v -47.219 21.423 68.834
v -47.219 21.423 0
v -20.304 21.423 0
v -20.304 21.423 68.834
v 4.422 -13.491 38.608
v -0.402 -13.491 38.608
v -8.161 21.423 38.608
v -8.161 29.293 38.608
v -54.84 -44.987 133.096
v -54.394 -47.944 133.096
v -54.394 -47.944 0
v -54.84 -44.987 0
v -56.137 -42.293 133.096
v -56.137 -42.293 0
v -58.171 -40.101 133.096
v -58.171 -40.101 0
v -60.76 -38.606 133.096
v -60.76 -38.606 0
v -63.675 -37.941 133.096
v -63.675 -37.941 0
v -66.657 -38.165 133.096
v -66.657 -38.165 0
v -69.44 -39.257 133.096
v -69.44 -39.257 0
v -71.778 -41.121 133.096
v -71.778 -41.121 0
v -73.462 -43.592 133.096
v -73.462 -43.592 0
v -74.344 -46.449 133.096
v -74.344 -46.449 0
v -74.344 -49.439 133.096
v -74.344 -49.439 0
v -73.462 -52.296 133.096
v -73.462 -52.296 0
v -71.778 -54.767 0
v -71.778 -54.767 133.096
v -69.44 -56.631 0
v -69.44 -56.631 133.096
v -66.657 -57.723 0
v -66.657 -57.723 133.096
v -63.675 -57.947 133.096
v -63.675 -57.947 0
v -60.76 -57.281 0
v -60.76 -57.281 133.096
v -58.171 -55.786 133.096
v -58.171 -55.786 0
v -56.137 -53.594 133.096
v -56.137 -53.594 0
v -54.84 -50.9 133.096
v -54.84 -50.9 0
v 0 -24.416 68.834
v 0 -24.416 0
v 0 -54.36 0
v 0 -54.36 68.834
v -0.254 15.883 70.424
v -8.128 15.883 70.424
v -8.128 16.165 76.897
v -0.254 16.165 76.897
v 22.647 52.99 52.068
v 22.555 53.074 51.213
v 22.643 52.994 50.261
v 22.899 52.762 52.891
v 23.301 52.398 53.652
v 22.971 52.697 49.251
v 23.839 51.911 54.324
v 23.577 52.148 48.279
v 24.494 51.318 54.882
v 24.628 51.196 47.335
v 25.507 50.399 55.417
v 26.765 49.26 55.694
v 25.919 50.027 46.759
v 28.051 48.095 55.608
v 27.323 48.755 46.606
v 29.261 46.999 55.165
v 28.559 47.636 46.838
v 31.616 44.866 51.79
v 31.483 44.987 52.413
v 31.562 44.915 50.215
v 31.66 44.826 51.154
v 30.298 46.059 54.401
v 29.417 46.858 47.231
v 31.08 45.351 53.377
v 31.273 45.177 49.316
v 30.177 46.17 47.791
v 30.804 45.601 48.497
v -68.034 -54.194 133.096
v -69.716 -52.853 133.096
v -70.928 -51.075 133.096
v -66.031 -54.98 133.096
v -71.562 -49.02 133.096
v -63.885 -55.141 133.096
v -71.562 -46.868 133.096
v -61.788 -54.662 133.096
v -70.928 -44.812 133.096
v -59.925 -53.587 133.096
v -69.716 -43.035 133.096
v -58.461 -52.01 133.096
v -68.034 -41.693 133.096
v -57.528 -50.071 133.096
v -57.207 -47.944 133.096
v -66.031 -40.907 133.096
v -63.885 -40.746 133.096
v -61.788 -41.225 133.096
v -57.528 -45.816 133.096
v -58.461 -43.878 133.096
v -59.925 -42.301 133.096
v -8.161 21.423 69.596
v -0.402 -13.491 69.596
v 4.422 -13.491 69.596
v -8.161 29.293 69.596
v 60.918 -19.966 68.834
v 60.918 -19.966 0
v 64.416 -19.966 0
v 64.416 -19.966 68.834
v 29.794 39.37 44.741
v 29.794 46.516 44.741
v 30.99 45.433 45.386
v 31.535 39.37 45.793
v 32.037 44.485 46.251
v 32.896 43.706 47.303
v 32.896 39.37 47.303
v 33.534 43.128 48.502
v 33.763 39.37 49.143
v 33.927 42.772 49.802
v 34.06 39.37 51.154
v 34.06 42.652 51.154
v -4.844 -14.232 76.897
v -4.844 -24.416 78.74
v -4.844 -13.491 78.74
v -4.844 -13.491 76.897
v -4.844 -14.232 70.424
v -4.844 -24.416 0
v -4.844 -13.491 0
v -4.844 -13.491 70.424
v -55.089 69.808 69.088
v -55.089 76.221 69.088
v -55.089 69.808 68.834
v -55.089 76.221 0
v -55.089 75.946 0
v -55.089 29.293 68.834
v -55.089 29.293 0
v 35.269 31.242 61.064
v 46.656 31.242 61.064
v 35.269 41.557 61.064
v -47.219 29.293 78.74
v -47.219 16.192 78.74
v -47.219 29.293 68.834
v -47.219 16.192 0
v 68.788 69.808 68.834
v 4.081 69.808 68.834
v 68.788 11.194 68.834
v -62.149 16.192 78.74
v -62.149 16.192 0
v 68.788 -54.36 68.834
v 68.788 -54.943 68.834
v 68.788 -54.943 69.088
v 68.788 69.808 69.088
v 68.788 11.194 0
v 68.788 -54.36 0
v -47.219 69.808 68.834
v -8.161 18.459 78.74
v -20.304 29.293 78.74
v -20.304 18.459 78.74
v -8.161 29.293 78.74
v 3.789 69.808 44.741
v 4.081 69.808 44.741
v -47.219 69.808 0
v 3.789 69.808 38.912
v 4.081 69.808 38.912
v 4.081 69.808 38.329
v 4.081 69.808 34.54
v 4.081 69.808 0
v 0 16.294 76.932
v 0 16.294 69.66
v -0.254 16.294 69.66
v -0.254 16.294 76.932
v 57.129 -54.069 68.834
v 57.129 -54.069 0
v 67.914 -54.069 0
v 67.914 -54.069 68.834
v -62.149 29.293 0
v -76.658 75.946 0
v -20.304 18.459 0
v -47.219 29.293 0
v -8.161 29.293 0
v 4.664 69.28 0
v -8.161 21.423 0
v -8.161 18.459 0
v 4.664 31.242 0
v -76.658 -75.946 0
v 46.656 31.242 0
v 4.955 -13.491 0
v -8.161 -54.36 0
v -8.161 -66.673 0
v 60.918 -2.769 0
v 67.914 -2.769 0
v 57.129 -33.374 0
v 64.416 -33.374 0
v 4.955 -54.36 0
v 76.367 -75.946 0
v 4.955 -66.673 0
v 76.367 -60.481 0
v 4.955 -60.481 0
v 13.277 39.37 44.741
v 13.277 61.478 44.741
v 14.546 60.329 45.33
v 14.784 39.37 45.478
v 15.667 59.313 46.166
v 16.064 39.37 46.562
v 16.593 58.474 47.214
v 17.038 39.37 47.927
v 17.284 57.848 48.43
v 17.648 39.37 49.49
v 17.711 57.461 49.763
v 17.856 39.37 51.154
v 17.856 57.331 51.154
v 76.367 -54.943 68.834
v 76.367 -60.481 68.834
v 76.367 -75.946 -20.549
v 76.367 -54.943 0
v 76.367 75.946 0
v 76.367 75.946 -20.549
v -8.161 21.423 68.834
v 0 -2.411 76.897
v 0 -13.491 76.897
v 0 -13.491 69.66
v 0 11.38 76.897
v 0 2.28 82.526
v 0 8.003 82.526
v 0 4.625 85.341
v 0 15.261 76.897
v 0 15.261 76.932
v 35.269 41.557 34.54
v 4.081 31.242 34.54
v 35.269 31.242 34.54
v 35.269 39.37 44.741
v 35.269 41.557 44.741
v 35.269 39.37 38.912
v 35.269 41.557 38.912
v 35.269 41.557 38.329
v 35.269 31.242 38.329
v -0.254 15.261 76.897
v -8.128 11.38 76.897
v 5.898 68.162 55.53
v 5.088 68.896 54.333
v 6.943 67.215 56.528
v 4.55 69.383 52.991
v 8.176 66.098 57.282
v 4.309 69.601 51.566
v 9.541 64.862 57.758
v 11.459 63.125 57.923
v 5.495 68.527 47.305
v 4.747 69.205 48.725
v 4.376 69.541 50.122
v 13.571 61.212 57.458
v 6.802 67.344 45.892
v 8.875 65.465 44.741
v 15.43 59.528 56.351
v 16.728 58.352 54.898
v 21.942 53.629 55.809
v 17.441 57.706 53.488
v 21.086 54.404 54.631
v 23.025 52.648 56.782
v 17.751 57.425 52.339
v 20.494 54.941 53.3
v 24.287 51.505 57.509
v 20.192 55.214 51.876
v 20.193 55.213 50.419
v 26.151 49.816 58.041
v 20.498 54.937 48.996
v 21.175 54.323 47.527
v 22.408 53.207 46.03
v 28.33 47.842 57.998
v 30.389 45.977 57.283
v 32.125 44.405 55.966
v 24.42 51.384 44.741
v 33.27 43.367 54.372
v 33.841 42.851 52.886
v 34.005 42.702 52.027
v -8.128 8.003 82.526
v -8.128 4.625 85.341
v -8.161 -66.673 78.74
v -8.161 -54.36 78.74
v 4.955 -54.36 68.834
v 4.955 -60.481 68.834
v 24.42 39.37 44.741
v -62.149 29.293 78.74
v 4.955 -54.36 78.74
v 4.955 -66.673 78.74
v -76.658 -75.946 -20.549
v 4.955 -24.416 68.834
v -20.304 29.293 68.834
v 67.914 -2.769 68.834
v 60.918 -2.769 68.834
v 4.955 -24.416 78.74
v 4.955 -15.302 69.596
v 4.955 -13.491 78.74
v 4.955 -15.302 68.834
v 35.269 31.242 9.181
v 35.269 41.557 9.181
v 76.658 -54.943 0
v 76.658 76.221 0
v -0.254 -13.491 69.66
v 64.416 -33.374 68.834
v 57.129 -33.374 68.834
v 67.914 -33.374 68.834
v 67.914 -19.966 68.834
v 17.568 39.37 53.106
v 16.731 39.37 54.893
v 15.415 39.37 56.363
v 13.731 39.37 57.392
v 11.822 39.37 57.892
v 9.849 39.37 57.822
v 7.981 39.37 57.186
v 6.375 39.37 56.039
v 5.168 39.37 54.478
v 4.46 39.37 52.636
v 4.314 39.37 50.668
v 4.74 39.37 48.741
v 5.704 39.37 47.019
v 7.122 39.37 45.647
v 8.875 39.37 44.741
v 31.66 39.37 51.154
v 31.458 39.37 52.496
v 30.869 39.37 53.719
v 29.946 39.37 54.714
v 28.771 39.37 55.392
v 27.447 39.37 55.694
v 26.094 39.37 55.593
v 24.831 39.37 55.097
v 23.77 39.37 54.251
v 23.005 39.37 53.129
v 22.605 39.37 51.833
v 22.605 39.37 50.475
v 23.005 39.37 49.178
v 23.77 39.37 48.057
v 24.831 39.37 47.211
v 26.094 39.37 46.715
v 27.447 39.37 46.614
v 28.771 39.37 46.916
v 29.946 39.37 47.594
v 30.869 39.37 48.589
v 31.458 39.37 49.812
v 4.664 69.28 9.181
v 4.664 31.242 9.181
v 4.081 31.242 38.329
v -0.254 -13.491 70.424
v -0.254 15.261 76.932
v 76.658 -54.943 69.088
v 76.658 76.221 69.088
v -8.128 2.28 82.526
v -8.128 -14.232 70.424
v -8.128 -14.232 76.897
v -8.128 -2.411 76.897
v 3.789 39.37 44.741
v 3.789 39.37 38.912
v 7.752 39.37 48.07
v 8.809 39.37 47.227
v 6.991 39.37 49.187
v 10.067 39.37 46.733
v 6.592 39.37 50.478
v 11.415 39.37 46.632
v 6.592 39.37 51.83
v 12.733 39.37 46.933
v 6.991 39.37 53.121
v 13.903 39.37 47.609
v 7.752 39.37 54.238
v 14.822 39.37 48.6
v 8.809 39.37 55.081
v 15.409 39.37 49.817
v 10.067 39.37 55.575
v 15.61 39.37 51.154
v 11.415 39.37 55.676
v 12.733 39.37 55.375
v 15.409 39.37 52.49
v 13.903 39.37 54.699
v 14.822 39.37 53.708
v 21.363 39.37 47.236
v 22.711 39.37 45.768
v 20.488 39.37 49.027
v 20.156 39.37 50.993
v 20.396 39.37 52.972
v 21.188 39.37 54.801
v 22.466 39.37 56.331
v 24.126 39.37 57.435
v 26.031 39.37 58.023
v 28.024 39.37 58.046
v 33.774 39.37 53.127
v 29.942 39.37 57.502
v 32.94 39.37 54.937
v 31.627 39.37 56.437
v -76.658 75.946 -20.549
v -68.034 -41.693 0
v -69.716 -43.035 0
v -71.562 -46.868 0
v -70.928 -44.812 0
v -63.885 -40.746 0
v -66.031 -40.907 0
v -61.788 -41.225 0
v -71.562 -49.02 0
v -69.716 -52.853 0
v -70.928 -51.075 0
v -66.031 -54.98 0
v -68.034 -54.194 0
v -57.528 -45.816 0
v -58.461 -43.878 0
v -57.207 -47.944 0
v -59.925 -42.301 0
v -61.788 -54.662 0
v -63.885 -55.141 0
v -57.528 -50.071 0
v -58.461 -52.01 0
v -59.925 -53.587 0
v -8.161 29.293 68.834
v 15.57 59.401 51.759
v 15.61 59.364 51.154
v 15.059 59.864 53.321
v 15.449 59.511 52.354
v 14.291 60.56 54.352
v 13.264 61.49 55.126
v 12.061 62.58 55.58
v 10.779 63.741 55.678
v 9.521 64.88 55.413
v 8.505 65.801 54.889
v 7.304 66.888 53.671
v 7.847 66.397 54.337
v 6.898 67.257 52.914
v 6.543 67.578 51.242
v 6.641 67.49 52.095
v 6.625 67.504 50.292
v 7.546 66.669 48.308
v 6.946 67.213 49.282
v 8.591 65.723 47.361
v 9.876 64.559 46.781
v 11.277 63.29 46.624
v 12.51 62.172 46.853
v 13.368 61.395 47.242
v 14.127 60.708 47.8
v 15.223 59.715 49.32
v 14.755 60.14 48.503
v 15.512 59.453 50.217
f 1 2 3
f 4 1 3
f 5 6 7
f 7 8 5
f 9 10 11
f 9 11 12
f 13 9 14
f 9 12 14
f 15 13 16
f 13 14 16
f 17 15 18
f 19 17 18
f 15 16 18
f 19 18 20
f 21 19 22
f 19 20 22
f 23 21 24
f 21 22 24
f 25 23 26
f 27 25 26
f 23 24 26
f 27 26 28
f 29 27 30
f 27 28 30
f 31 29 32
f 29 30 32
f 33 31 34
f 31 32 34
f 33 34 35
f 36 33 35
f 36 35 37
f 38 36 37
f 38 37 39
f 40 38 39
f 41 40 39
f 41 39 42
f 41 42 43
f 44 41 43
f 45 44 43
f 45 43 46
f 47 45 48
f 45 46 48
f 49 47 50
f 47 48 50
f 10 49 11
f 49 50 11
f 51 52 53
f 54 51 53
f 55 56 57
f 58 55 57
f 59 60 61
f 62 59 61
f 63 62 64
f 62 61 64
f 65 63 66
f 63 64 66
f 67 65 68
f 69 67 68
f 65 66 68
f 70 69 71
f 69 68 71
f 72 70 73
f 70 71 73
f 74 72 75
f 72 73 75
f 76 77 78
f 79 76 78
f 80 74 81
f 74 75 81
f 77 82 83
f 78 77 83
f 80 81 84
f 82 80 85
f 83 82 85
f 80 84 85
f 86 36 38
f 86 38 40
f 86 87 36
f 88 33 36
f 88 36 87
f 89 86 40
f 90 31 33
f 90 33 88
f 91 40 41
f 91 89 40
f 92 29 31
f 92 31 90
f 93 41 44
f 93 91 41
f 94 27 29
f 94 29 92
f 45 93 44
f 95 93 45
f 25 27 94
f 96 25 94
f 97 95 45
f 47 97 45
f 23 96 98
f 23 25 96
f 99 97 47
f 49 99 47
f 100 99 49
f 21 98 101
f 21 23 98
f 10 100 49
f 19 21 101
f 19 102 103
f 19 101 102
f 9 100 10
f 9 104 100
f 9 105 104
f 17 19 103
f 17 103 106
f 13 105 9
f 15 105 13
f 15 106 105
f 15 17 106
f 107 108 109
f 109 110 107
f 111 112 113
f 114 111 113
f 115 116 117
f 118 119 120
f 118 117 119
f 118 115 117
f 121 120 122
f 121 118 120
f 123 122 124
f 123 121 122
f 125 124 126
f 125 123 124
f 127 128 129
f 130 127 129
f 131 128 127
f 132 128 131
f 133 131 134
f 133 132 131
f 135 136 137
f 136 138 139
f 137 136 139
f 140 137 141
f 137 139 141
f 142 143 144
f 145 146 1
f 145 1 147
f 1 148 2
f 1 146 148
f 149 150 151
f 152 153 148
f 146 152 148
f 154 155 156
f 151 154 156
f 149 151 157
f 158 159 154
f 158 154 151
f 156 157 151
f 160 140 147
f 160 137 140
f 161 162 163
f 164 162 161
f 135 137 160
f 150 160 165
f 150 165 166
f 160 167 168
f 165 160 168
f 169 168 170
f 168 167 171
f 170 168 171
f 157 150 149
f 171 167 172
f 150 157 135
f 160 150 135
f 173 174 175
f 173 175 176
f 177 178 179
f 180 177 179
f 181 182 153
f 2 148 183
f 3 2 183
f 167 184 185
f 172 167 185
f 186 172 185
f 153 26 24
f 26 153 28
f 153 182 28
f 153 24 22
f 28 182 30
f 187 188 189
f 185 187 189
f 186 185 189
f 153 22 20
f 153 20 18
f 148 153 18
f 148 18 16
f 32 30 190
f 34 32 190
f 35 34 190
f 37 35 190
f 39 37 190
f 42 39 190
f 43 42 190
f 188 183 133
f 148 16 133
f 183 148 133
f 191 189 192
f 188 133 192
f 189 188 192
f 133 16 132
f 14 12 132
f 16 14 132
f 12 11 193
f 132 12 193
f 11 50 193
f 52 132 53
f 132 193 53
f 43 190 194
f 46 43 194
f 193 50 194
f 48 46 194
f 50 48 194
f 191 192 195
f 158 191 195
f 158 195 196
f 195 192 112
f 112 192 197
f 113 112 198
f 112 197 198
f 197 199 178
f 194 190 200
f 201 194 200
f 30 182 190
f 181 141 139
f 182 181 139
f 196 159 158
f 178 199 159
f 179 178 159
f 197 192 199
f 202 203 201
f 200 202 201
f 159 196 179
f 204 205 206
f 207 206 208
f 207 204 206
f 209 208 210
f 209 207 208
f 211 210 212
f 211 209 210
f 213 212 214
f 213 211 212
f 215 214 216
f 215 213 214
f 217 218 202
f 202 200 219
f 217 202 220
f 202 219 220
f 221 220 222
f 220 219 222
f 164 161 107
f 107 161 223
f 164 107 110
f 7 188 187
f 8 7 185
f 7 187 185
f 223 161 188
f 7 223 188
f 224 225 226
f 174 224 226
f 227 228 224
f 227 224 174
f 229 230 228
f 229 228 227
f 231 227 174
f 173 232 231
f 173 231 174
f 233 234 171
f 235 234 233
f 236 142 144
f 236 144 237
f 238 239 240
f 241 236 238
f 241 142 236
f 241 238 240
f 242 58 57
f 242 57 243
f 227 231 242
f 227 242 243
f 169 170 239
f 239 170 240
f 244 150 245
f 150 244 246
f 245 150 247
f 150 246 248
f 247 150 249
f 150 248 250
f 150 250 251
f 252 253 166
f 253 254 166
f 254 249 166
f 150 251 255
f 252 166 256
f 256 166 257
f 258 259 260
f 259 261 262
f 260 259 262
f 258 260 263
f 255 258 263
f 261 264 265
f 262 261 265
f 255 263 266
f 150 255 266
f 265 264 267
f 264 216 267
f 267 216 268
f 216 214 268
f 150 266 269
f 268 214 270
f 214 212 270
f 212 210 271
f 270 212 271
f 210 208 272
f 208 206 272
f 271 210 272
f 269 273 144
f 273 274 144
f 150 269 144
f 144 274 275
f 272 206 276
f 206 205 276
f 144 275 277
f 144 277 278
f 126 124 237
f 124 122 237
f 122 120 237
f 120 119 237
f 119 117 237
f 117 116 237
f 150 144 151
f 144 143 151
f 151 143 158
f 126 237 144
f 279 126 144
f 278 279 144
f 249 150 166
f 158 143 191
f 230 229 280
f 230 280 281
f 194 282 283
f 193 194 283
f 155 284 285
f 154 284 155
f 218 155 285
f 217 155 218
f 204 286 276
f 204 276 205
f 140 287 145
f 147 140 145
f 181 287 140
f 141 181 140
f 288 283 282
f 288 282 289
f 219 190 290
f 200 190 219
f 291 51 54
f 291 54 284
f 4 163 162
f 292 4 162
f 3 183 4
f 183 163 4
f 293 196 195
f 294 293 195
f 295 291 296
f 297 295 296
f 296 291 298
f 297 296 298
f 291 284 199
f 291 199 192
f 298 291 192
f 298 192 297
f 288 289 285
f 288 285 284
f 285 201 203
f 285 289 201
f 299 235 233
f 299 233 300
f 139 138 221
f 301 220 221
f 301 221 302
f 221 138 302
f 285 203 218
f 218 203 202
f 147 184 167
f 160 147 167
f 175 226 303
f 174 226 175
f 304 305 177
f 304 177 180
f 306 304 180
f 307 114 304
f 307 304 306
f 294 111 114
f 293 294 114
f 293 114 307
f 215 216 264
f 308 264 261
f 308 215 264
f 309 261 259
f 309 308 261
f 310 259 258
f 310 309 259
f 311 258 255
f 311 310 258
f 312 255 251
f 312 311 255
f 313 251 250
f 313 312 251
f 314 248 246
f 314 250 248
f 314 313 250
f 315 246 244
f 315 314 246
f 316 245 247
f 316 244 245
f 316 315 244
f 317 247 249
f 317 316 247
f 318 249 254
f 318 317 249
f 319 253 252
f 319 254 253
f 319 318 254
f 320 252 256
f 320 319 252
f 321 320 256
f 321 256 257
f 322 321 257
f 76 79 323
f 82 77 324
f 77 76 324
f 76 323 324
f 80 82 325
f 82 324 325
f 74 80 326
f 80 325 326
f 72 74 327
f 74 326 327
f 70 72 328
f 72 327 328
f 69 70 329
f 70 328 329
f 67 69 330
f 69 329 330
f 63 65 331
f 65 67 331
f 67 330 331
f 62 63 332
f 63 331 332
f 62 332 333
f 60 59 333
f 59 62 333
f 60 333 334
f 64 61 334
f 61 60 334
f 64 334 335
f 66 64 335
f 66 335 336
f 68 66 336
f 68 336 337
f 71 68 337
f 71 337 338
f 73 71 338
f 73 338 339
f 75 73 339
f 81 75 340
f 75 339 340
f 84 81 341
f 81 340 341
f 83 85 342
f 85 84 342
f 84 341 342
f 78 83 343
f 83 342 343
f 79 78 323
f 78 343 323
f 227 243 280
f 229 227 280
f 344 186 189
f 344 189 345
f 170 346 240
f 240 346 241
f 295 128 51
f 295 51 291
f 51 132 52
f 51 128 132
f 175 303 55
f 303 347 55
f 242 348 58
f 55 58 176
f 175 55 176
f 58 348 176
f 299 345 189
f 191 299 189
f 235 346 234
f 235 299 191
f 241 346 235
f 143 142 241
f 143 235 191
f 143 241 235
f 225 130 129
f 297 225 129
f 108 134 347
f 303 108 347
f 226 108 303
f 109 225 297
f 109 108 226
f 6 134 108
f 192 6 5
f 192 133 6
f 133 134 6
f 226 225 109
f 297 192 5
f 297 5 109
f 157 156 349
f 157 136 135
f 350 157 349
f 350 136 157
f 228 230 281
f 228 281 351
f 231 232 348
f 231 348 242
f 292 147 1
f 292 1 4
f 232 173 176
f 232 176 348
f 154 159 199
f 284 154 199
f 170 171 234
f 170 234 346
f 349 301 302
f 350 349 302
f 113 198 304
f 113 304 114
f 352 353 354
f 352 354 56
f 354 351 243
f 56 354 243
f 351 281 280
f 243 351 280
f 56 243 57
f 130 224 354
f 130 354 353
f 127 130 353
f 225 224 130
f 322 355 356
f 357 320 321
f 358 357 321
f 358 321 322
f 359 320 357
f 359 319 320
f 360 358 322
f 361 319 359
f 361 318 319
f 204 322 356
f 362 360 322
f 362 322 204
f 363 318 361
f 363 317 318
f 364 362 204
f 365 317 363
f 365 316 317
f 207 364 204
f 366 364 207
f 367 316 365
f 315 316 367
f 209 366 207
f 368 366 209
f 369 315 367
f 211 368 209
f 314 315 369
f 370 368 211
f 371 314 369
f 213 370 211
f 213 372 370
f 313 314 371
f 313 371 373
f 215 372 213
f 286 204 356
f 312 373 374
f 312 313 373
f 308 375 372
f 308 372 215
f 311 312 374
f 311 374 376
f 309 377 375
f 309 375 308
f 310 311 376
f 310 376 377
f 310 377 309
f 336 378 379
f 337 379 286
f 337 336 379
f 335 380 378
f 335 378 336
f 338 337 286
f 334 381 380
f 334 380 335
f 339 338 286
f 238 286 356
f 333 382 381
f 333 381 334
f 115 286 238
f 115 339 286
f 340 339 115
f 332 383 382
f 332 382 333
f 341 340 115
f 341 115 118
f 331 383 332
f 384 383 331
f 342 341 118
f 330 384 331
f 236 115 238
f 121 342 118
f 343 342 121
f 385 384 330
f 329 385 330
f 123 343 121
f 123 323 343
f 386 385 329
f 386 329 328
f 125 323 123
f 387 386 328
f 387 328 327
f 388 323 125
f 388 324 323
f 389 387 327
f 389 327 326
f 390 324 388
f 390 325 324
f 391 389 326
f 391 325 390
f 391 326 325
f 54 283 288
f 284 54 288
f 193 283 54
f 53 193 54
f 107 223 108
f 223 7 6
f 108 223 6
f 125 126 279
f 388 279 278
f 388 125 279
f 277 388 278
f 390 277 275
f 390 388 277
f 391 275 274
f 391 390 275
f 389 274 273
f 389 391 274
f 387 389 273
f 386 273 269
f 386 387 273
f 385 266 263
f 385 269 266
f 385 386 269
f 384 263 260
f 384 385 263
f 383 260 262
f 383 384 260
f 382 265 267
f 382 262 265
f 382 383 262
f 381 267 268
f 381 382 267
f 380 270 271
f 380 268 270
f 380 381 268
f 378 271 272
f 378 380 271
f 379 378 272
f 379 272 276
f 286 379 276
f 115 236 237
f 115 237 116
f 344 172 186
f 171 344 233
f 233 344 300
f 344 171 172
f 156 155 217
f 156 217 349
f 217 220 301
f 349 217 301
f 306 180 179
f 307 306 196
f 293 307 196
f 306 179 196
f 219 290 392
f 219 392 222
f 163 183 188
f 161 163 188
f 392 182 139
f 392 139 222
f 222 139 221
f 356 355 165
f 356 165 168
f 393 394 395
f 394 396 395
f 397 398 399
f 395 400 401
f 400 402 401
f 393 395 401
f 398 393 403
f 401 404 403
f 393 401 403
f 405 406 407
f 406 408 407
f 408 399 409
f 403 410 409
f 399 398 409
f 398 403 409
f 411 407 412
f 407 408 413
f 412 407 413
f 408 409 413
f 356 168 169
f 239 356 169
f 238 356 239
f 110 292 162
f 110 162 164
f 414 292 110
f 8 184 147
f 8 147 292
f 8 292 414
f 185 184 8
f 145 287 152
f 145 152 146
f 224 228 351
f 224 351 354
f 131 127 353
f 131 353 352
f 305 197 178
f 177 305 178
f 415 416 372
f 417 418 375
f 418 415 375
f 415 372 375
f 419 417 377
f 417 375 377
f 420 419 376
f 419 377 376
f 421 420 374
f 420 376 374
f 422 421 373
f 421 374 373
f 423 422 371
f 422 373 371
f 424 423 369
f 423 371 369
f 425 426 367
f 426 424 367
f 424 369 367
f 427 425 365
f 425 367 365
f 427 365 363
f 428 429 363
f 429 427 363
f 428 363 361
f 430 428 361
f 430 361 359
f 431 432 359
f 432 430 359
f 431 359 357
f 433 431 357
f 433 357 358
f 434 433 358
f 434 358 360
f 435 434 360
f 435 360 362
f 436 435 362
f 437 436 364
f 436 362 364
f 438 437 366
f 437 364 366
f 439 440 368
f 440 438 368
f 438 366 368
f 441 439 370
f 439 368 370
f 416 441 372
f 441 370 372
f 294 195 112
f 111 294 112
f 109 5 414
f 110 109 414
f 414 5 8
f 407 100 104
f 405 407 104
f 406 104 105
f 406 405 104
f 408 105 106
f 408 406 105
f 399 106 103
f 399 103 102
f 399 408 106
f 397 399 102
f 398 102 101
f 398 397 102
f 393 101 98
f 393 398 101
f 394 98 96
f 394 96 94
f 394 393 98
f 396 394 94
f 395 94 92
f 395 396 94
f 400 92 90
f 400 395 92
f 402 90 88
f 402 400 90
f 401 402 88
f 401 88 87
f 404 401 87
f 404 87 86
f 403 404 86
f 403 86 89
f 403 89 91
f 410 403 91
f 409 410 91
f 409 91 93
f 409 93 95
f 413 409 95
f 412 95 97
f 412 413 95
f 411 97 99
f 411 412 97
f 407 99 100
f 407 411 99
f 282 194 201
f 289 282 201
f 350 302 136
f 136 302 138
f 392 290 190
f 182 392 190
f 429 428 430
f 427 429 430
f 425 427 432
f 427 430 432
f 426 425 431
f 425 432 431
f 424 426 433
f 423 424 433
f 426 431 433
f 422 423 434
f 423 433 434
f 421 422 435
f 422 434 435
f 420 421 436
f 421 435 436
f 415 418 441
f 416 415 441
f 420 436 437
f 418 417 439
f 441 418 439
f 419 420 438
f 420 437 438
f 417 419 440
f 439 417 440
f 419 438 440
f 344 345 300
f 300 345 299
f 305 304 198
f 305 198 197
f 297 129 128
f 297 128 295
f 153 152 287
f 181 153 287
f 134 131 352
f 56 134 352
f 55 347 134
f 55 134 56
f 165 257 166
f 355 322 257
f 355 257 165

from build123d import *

# Parameters (mm, degrees)
F0_W          = 153.0245915055
F0_H          = 20.5490160733
F1_DEPTH      = 75.946
F1_DEPTH_BACK = 75.946
F3_DEPTH      = 68.834
F5_START      = -31.242
F4_W          = 31.1878696084
F4_H          = 3.7891790271
F4_W_2        = 30.604918953
F4_H_2        = 9.1814752668
F5_DEPTH      = 38.862
F7_START      = -39.37
F6_R          = 4.5342929644
F6_R_2        = 4.5529905845
F7_DEPTH      = 30.734
F8_W          = 7.8698322177
F8_H          = 124.7514784336
F9_DEPTH      = 69.088
F10_W         = 3.4977030009
F10_H         = 13.4078674018
F11_DEPTH     = 68.834
F12_W         = 4.9550831318
F12_H         = 39.0577064827
F12_W_2       = 39.0577036887
F12_H_2       = 7.869835943
F13_DEPTH     = 68.834
F15_START     = 38.608
F15_DEPTH     = 30.988
F16_W         = 9.7991945222
F16_H         = 10.9250182286
F16_W_2       = 12.1427290142
F16_H_2       = 10.8340159059
F16_W_3       = 14.9299055338
F16_H_3       = 13.1014734507
F16_W_4       = 13.116395101
F16_H_4       = 12.3132541776
F17_DEPTH     = 78.74
F19_DEPTH     = 8.128
F20_R         = 10.030835309
F20_R_2       = 7.2175731122
F21_DEPTH     = 133.096
F22_W         = 29.4703273103
F22_H         = 0.956825912
F23_DEPTH     = 0.254


with BuildPart() as f1:
    # F0 (on Front) → F1 (new body, two sides)
    with BuildSketch(Plane.XZ) as f1_sk:
        with Locations((-0.1457370818, -10.2745080367)):
            Rectangle(F0_W, F0_H)
    extrude(amount=F1_DEPTH)
    extrude(f1_sk.sketch, amount=-F1_DEPTH_BACK)

    # F2 (on face) → F3 (join)
    with BuildSketch(Plane.XY):
        Polygon((69.0796747804, 69.8083639145), (4.0806569159, 69.8083639145), (69.0796747804, 10.9303286299), align=None)
    extrude(amount=F3_DEPTH)

    # F4 (on Front) → F5 (join)
    with BuildSketch(Plane.XZ.offset(F5_START)):
        with Locations((19.6745917201, 36.4344269037)):
            Rectangle(F4_W, F4_H)
        Polygon((35.2685265243, 61.0640980303), (35.2685265243, 38.3290164173), (35.2685265243, 34.5398373902), (35.2685265243, 9.1814752668), (35.2685265243, 0), (68.7882006168, 0), (68.7882006168, 61.0640980303), align=None)
        with Locations((19.9660670478, 4.5907376334)):
            Rectangle(F4_W_2, F4_H_2)
    extrude(amount=-F5_DEPTH)

    # F6 (on Front) → F7 (join)
    with BuildSketch(Plane.XZ.offset(F7_START)):
        with BuildLine():
            ThreePointArc((13.2766587373, 44.7414778173), (16.5933676498, 47.2141890003), (17.8556101724, 51.153935492))
            ThreePointArc((17.8556101724, 51.153935492), (7.13631922, 56.6712374301), (8.875472686, 44.7414778173))
            Line((8.875472686, 44.7414778173), (13.2766587373, 44.7414778173))
        make_face()
        with Locations((11.0760657117, 51.153935492)):
            Circle(F6_R, mode=Mode.SUBTRACT)
        with BuildLine():
            Line((13.2766587373, 44.7414778173), (8.875472686, 44.7414778173))
            ThreePointArc((8.875472686, 44.7414778173), (11.0760657117, 44.3743910313), (13.2766587373, 44.7414778173))
        make_face()
        with BuildLine():
            ThreePointArc((13.2766587373, 44.7414778173), (11.0760657117, 44.3743910313), (8.875472686, 44.7414778173))
            Line((8.875472686, 44.7414778173), (3.7891815882, 44.7414778173))
            Line((3.7891815882, 44.7414778173), (3.7891815882, 38.9119684696))
            Line((3.7891815882, 38.9119684696), (17.7800003439, 38.9119684696))
            Line((17.7800003439, 38.9119684696), (17.7800003439, 44.7414778173))
            Line((17.7800003439, 44.7414778173), (13.2766587373, 44.7414778173))
        make_face()
        with BuildLine():
            Line((24.4199383292, 44.7414778173), (17.7800003439, 44.7414778173))
            Line((17.7800003439, 44.7414778173), (17.7800003439, 38.9119684696))
            Line((17.7800003439, 38.9119684696), (35.2685265243, 38.9119684696))
            Line((35.2685265243, 38.9119684696), (35.2685265243, 44.7414778173))
            Line((35.2685265243, 44.7414778173), (29.7944870558, 44.7414778173))
            ThreePointArc((29.7944870558, 44.7414778173), (27.1072126925, 44.2011621652), (24.4199383292, 44.7414778173))
        make_face()
        with BuildLine():
            Line((29.7944870558, 44.7414778173), (24.4199383292, 44.7414778173))
            ThreePointArc((24.4199383292, 44.7414778173), (27.1072126925, 44.2011621652), (29.7944870558, 44.7414778173))
        make_face()
        with BuildLine():
            ThreePointArc((34.0599860193, 51.153935492), (23.256430472, 56.9429365479), (24.4199383292, 44.7414778173))
            Line((24.4199383292, 44.7414778173), (29.7944870558, 44.7414778173))
            ThreePointArc((29.7944870558, 44.7414778173), (32.8962137483, 47.3031532716), (34.0599860193, 51.153935492))
        make_face()
        with Locations((27.1072126925, 51.153935492)):
            Circle(F6_R_2, mode=Mode.SUBTRACT)
    extrude(amount=-F7_DEPTH)

    # F8 (on Top) → F9 (join)
    with BuildSketch(Plane.XY):
        Polygon((-55.0888516009, 69.8083639145), (68.7882006168, 69.8083639145), (76.6580328345, 69.8083639145), (76.6580328345, 76.2208253145), (-55.0888516009, 76.2208253145), align=None)
        with Locations((72.7231167257, 7.4326246977)):
            Rectangle(F8_W, F8_H)
    extrude(amount=F9_DEPTH)

    # F10 (on Top) → F11 (join)
    with BuildSketch(Plane.XY):
        Polygon((67.9137706757, -19.9660658836), (67.9137706757, -2.7690164279), (60.9183646739, -2.7690164279), (60.9183646739, -19.9660658836), (64.4160676748, -19.9660658836), align=None)
        with Locations((66.1649191752, -26.6699995846)):
            Rectangle(F10_W, F10_H)
        Polygon((67.9137706757, -54.0686920285), (67.9137706757, -33.3739332855), (64.4160676748, -33.3739332855), (57.1291781962, -33.3739332855), (57.1291781962, -54.0686920285), align=None)
    extrude(amount=F11_DEPTH)

    # F12 (on Top) → F13 (join)
    with BuildSketch(Plane.XY):
        Polygon((76.366558671, -60.4811497033), (76.366558671, -54.3601661921), (4.9550831318, -54.3601661921), (0, -54.3601661921), (0, -60.4811497033), align=None)
        with Locations((2.4775415659, -34.8313129507)):
            Rectangle(F12_W, F12_H)
        Polygon((-47.2190156579, 75.9293437004), (-55.0888516009, 75.9293437004), (-55.0888516009, 21.4234422892), (-47.2190156579, 21.4234422892), (-47.2190156579, 29.2932782322), align=None)
        with Locations((-27.6901638135, 25.3583602607)):
            Rectangle(F12_W_2, F12_H_2)
    extrude(amount=F13_DEPTH)

    # F14 (on face) → F15 (join)
    with BuildSketch(Plane.XY.offset(F15_START)):
        Polygon((4.9550831318, -15.3024597093), (-8.1613119692, 29.2932782322), (-8.1613119692, 21.4234422892), (0, -15.3024597093), align=None)
    extrude(amount=F15_DEPTH)

    # F16 (on face) → F17 (join)
    with BuildSketch(Plane.XY):
        with Locations((0.0554858707, -18.9537699334)):
            Rectangle(F16_W, F16_H)
        with Locations((-14.2326764762, 23.8762702793)):
            Rectangle(F16_W_2, F16_H_2)
        with Locations((-54.6839684248, 22.7425415069)):
            Rectangle(F16_W_3, F16_H_3)
        with Locations((-1.6031144187, -60.5167932808)):
            Rectangle(F16_W_4, F16_H_4)
    extrude(amount=F17_DEPTH)

    # F18 (on Right) → F19 (join)
    with BuildSketch(Plane.YZ):
        Polygon((15.8831458539, 70.4239010811), (16.1645952612, 76.8972411752), (11.3799506798, 76.8972411752), (8.0025549978, 82.5262367725), (4.6251597814, 85.3407308459), (2.2797496705, 82.5262367725), (-2.4110814556, 76.8972411752), (-14.2319686711, 76.8972411752), (-14.2319686711, 70.4239010811), align=None)
    extrude(amount=-F19_DEPTH)

    # F20 (on Top) → F21 (join)
    with BuildSketch(Plane.XY):
        with Locations((-64.4248649478, -47.9438453913)):
            Circle(F20_R)
        with Locations((-64.4248649478, -47.9438453913)):
            Circle(F20_R_2, mode=Mode.SUBTRACT)
    extrude(amount=F21_DEPTH)

    # F22 (on Right) → F23 (join)
    with BuildSketch(Plane.YZ):
        Polygon((16.2943303585, 69.6600824594), (16.2943303585, 76.9319757819), (15.2609543875, 76.9319757819), (15.2609543875, 70.6169083714), (15.2609543875, 69.6600824594), align=None)
        with Locations((0.5257907324, 70.1384954154)):
            Rectangle(F22_W, F22_H)
    extrude(amount=-F23_DEPTH)


solid = f1.part
